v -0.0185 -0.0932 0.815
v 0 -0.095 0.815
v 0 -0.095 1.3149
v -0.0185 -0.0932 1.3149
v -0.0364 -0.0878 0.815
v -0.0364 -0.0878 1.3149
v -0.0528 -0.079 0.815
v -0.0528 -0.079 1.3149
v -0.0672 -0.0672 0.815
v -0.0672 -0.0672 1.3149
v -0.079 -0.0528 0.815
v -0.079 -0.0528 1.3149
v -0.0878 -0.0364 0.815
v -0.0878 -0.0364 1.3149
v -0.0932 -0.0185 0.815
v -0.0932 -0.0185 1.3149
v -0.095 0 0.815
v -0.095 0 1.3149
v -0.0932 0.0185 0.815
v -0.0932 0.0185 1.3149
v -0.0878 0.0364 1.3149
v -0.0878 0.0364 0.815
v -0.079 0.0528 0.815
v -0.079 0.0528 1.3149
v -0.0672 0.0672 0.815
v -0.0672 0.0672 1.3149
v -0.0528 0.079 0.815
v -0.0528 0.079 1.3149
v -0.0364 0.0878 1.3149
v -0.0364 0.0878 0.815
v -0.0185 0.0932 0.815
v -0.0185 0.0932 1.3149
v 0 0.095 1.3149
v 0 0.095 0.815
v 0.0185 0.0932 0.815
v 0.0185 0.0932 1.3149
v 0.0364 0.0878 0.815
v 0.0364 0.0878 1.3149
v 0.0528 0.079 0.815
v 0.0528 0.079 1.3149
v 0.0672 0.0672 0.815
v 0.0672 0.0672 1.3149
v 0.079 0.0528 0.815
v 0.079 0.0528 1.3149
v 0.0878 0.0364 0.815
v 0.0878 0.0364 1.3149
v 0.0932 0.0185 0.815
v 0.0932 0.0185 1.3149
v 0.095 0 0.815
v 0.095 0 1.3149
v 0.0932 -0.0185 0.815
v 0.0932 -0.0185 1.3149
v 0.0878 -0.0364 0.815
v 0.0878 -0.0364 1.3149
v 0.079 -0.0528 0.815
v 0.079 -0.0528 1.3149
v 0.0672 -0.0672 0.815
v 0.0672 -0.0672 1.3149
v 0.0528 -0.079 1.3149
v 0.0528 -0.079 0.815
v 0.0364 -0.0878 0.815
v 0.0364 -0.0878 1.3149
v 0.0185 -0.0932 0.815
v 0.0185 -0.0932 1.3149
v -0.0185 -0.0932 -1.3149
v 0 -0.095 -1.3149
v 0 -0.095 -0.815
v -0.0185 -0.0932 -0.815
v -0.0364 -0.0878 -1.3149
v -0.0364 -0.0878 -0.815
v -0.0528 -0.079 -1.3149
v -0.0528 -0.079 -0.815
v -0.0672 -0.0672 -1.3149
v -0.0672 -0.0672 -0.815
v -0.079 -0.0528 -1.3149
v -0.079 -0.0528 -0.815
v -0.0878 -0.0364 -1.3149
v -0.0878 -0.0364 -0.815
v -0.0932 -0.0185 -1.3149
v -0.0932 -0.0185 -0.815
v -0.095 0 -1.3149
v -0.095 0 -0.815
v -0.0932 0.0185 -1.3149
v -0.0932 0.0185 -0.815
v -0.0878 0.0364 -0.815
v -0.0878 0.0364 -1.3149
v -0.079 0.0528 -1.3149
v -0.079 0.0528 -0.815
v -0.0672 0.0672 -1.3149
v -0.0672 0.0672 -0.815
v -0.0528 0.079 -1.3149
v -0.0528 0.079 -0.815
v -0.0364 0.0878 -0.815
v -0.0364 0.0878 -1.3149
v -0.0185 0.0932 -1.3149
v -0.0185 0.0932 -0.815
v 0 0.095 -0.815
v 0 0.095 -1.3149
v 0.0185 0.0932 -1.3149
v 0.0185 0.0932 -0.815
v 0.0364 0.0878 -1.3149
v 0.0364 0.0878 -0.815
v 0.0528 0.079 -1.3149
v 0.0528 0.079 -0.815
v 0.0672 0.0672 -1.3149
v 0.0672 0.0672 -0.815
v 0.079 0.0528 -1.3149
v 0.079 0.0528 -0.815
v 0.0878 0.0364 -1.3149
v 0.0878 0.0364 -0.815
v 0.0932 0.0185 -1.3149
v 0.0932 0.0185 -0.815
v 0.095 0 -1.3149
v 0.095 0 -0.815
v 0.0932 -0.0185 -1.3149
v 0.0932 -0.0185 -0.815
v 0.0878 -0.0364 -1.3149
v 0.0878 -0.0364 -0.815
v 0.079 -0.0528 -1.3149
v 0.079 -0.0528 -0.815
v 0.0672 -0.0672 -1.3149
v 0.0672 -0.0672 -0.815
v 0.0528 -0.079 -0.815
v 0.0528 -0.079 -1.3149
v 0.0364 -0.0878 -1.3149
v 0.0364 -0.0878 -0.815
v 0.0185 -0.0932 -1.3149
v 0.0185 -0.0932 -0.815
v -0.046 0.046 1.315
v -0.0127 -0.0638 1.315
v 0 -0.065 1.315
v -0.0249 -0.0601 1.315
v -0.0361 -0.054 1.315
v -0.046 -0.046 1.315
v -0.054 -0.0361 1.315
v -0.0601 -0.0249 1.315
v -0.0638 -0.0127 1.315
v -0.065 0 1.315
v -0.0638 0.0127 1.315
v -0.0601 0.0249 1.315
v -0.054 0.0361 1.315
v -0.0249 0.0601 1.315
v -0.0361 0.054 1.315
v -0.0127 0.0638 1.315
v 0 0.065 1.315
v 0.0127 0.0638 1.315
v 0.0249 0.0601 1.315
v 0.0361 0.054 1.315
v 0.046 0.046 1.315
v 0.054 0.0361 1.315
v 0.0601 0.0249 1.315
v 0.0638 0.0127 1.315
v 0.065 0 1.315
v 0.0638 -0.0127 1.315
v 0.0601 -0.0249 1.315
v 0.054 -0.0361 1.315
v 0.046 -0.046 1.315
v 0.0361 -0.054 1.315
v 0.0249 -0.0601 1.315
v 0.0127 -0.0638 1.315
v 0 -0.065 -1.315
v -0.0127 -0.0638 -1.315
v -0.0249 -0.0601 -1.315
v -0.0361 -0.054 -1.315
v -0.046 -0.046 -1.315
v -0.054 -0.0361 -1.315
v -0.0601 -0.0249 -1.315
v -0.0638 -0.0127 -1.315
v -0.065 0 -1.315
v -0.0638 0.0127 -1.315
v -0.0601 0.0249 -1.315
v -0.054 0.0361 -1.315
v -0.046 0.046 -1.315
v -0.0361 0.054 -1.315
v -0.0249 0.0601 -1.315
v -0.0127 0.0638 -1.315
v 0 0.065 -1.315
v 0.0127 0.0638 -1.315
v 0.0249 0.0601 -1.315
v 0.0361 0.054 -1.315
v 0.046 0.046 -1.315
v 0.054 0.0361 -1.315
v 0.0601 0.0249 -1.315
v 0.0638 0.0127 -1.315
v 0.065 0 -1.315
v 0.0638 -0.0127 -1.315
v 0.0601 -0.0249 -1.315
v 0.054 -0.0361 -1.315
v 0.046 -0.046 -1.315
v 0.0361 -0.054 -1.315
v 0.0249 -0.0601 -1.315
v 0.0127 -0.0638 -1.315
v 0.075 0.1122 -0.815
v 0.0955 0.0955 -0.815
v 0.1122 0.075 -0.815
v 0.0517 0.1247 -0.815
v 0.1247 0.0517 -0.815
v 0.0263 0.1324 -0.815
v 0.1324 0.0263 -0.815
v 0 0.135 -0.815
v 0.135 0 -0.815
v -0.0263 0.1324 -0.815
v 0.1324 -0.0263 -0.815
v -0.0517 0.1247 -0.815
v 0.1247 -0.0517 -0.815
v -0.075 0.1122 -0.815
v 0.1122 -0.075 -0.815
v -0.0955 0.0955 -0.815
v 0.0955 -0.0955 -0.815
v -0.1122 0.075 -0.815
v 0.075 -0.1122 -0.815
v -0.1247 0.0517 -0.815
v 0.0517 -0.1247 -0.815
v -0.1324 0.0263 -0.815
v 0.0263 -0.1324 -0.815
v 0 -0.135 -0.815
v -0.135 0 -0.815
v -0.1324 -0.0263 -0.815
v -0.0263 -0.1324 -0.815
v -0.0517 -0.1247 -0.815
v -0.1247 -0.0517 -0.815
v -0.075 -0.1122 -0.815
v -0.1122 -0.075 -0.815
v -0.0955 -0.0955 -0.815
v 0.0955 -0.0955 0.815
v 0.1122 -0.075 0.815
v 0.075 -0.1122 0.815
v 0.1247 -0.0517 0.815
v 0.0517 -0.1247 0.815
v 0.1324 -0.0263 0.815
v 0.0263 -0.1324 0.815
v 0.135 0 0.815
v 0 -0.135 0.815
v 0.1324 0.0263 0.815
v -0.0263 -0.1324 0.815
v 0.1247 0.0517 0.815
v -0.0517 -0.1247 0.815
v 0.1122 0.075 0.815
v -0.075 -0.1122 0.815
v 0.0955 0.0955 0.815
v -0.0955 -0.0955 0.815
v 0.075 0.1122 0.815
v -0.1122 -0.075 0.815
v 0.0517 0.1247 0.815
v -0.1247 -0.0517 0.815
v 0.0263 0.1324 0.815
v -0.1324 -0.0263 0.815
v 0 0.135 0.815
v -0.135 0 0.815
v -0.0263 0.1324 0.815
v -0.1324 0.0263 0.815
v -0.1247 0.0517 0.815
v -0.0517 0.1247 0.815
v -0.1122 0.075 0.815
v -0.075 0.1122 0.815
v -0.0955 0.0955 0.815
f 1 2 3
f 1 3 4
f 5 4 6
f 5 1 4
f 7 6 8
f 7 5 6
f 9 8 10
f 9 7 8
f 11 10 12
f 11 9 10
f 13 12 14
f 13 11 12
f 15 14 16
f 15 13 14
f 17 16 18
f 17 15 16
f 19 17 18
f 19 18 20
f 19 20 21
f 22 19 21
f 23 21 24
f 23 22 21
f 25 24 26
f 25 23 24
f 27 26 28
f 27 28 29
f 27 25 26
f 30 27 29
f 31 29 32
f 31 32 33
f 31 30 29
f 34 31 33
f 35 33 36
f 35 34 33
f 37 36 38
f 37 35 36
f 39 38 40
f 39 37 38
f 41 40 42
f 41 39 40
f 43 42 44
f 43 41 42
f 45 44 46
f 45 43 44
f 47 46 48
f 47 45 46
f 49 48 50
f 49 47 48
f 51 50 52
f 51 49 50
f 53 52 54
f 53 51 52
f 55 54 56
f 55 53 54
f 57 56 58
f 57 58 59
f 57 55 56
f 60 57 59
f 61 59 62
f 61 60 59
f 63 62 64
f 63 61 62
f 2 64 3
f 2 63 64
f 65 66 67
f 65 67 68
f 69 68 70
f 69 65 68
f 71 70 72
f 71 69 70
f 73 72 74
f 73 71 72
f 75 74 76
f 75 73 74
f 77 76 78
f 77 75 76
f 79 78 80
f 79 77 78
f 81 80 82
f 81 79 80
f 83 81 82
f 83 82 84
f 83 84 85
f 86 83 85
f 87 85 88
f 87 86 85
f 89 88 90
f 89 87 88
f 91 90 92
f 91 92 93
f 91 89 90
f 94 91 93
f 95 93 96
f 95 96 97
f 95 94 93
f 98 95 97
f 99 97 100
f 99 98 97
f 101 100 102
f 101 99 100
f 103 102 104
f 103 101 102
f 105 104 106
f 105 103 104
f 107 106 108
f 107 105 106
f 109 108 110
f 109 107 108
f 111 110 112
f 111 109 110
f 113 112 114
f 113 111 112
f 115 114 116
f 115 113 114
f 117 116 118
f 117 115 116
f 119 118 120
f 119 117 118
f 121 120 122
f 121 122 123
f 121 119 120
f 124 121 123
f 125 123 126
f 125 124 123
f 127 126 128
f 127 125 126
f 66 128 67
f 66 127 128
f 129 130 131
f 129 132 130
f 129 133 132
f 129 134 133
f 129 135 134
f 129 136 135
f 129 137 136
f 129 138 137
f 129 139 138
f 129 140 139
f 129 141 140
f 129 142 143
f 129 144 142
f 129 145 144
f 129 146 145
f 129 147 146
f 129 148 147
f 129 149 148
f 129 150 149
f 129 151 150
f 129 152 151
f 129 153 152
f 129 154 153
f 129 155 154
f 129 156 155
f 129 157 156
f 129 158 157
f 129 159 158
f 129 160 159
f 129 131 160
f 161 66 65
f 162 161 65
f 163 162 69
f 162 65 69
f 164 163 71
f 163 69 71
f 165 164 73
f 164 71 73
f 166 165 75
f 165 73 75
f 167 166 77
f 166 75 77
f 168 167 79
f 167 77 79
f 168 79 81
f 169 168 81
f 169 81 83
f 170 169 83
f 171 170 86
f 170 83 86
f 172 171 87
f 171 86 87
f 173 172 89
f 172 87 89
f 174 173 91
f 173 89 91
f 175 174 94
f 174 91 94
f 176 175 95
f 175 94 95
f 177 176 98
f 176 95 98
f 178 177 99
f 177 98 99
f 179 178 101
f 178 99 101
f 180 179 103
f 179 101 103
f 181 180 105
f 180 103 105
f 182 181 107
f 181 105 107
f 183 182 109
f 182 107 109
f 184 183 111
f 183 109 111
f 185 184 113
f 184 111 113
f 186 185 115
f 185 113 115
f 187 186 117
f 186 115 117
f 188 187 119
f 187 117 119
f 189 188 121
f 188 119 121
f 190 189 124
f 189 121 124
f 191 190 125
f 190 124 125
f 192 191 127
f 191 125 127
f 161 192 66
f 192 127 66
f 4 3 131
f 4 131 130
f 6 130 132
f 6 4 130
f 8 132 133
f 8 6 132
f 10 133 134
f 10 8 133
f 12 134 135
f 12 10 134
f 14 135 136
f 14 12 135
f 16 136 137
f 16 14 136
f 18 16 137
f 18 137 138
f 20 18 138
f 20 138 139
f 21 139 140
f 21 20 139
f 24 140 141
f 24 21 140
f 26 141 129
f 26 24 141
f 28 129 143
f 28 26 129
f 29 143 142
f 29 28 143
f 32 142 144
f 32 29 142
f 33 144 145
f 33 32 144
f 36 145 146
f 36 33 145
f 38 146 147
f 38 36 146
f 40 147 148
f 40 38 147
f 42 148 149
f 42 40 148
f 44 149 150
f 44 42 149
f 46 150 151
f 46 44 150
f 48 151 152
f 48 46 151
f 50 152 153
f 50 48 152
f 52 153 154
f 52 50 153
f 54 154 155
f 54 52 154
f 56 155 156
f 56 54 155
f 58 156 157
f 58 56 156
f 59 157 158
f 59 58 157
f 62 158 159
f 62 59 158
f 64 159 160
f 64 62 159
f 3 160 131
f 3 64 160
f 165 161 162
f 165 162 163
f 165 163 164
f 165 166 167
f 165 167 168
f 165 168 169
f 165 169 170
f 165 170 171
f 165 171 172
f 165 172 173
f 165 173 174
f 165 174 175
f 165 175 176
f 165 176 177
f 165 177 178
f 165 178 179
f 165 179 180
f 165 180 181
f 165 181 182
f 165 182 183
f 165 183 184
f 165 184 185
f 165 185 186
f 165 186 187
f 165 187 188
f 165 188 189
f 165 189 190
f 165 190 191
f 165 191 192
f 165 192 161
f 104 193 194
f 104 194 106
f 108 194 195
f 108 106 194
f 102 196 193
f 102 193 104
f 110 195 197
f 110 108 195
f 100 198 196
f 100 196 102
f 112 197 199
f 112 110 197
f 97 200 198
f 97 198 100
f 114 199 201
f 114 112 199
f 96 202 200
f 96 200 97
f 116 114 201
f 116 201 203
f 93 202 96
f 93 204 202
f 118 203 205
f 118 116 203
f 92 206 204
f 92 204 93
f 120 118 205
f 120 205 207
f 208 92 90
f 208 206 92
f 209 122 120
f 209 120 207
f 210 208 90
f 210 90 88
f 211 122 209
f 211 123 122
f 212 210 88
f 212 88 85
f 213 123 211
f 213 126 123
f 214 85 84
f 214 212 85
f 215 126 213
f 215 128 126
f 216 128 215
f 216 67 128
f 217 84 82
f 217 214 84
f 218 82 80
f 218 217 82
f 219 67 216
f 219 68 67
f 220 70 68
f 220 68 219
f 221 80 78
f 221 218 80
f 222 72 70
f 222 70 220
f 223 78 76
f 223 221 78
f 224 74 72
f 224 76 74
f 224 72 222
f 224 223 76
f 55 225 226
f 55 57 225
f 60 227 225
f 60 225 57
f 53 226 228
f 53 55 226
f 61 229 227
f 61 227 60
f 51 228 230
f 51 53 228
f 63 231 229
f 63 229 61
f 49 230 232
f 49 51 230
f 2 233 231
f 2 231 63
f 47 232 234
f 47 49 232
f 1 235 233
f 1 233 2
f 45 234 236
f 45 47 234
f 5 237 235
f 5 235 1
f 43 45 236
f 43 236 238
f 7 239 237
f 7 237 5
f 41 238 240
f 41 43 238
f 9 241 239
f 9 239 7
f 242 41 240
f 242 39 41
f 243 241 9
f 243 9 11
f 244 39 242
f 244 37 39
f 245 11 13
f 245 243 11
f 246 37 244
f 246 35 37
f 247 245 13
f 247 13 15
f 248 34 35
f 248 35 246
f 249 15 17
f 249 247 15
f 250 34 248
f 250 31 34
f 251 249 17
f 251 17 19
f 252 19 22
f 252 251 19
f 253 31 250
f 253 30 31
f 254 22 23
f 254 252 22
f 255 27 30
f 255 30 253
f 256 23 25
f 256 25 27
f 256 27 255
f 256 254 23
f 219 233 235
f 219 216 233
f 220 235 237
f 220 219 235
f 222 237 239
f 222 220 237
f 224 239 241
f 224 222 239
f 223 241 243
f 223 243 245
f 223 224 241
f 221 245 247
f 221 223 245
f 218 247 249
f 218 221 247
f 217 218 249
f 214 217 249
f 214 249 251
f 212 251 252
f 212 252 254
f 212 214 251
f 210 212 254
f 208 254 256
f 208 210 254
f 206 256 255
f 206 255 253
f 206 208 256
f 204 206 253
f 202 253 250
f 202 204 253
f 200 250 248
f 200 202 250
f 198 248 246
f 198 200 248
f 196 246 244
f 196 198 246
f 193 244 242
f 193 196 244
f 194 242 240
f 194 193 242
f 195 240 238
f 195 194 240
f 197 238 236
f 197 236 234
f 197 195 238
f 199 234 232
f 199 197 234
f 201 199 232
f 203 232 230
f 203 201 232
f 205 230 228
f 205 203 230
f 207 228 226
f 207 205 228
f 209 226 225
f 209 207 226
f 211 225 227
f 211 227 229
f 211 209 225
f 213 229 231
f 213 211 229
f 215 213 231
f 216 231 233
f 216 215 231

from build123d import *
from OCP.BRepFilletAPI import BRepFilletAPI_MakeChamfer

# Parameters (mm, degrees)
CHAMFER1_SIZE  = 0.03
CHAMFER1_SIZE2 = 0.000130901


with BuildPart() as part:
    # Sketch2 → Revolve1 (revolve)
    with BuildSketch(Plane(origin=(0, 0, 0), x_dir=(0, 0, -1), z_dir=(1, 0, 0)), mode=Mode.PRIVATE) as revolve1_sk:
        Polygon((-1.315, 0), (-1.315, 0.095), (-0.815, 0.095), (-0.815, 0.135), (0.815, 0.135), (0.815, 0.095), (1.315, 0.095), (1.315, 0), align=None)
    revolve(revolve1_sk.sketch.rotate(Axis((0, 0, 1.315), (0, 0, -1)), 180), axis=Axis((0, 0, 1.315), (0, 0, -1)))

    # Chamfer1: one chamfer whose edges measure the first distance from different faces: ONE call of the kernel's chamfer builder (chamfer() names one face for all edges)
    chamfer1_edges_1 = [part.edges().sort_by_distance(p)[0] for p in [
        (0, 0.095, 1.315),
    ]]
    chamfer1_side_1 = [part.faces().sort_by_distance(p)[0] for p in [
        (0, 0, 1.315),
    ]]
    chamfer1_edges_2 = [part.edges().sort_by_distance(p)[0] for p in [
        (0, 0.095, -1.315),
    ]]
    chamfer1_side_2 = [part.faces().sort_by_distance(p)[0] for p in [
        (0, 0, -1.315),
    ]]
    chamfer1 = BRepFilletAPI_MakeChamfer(part.part.solid().wrapped)
    for e in chamfer1_edges_1:
        chamfer1.Add(CHAMFER1_SIZE, CHAMFER1_SIZE2, e.wrapped, chamfer1_side_1[0].wrapped)  # the first distance lies on this face
    for e in chamfer1_edges_2:
        chamfer1.Add(CHAMFER1_SIZE, CHAMFER1_SIZE2, e.wrapped, chamfer1_side_2[0].wrapped)  # the first distance lies on this face
    add(Compound.cast(chamfer1.Shape()), mode=Mode.REPLACE)


solid = part.part
